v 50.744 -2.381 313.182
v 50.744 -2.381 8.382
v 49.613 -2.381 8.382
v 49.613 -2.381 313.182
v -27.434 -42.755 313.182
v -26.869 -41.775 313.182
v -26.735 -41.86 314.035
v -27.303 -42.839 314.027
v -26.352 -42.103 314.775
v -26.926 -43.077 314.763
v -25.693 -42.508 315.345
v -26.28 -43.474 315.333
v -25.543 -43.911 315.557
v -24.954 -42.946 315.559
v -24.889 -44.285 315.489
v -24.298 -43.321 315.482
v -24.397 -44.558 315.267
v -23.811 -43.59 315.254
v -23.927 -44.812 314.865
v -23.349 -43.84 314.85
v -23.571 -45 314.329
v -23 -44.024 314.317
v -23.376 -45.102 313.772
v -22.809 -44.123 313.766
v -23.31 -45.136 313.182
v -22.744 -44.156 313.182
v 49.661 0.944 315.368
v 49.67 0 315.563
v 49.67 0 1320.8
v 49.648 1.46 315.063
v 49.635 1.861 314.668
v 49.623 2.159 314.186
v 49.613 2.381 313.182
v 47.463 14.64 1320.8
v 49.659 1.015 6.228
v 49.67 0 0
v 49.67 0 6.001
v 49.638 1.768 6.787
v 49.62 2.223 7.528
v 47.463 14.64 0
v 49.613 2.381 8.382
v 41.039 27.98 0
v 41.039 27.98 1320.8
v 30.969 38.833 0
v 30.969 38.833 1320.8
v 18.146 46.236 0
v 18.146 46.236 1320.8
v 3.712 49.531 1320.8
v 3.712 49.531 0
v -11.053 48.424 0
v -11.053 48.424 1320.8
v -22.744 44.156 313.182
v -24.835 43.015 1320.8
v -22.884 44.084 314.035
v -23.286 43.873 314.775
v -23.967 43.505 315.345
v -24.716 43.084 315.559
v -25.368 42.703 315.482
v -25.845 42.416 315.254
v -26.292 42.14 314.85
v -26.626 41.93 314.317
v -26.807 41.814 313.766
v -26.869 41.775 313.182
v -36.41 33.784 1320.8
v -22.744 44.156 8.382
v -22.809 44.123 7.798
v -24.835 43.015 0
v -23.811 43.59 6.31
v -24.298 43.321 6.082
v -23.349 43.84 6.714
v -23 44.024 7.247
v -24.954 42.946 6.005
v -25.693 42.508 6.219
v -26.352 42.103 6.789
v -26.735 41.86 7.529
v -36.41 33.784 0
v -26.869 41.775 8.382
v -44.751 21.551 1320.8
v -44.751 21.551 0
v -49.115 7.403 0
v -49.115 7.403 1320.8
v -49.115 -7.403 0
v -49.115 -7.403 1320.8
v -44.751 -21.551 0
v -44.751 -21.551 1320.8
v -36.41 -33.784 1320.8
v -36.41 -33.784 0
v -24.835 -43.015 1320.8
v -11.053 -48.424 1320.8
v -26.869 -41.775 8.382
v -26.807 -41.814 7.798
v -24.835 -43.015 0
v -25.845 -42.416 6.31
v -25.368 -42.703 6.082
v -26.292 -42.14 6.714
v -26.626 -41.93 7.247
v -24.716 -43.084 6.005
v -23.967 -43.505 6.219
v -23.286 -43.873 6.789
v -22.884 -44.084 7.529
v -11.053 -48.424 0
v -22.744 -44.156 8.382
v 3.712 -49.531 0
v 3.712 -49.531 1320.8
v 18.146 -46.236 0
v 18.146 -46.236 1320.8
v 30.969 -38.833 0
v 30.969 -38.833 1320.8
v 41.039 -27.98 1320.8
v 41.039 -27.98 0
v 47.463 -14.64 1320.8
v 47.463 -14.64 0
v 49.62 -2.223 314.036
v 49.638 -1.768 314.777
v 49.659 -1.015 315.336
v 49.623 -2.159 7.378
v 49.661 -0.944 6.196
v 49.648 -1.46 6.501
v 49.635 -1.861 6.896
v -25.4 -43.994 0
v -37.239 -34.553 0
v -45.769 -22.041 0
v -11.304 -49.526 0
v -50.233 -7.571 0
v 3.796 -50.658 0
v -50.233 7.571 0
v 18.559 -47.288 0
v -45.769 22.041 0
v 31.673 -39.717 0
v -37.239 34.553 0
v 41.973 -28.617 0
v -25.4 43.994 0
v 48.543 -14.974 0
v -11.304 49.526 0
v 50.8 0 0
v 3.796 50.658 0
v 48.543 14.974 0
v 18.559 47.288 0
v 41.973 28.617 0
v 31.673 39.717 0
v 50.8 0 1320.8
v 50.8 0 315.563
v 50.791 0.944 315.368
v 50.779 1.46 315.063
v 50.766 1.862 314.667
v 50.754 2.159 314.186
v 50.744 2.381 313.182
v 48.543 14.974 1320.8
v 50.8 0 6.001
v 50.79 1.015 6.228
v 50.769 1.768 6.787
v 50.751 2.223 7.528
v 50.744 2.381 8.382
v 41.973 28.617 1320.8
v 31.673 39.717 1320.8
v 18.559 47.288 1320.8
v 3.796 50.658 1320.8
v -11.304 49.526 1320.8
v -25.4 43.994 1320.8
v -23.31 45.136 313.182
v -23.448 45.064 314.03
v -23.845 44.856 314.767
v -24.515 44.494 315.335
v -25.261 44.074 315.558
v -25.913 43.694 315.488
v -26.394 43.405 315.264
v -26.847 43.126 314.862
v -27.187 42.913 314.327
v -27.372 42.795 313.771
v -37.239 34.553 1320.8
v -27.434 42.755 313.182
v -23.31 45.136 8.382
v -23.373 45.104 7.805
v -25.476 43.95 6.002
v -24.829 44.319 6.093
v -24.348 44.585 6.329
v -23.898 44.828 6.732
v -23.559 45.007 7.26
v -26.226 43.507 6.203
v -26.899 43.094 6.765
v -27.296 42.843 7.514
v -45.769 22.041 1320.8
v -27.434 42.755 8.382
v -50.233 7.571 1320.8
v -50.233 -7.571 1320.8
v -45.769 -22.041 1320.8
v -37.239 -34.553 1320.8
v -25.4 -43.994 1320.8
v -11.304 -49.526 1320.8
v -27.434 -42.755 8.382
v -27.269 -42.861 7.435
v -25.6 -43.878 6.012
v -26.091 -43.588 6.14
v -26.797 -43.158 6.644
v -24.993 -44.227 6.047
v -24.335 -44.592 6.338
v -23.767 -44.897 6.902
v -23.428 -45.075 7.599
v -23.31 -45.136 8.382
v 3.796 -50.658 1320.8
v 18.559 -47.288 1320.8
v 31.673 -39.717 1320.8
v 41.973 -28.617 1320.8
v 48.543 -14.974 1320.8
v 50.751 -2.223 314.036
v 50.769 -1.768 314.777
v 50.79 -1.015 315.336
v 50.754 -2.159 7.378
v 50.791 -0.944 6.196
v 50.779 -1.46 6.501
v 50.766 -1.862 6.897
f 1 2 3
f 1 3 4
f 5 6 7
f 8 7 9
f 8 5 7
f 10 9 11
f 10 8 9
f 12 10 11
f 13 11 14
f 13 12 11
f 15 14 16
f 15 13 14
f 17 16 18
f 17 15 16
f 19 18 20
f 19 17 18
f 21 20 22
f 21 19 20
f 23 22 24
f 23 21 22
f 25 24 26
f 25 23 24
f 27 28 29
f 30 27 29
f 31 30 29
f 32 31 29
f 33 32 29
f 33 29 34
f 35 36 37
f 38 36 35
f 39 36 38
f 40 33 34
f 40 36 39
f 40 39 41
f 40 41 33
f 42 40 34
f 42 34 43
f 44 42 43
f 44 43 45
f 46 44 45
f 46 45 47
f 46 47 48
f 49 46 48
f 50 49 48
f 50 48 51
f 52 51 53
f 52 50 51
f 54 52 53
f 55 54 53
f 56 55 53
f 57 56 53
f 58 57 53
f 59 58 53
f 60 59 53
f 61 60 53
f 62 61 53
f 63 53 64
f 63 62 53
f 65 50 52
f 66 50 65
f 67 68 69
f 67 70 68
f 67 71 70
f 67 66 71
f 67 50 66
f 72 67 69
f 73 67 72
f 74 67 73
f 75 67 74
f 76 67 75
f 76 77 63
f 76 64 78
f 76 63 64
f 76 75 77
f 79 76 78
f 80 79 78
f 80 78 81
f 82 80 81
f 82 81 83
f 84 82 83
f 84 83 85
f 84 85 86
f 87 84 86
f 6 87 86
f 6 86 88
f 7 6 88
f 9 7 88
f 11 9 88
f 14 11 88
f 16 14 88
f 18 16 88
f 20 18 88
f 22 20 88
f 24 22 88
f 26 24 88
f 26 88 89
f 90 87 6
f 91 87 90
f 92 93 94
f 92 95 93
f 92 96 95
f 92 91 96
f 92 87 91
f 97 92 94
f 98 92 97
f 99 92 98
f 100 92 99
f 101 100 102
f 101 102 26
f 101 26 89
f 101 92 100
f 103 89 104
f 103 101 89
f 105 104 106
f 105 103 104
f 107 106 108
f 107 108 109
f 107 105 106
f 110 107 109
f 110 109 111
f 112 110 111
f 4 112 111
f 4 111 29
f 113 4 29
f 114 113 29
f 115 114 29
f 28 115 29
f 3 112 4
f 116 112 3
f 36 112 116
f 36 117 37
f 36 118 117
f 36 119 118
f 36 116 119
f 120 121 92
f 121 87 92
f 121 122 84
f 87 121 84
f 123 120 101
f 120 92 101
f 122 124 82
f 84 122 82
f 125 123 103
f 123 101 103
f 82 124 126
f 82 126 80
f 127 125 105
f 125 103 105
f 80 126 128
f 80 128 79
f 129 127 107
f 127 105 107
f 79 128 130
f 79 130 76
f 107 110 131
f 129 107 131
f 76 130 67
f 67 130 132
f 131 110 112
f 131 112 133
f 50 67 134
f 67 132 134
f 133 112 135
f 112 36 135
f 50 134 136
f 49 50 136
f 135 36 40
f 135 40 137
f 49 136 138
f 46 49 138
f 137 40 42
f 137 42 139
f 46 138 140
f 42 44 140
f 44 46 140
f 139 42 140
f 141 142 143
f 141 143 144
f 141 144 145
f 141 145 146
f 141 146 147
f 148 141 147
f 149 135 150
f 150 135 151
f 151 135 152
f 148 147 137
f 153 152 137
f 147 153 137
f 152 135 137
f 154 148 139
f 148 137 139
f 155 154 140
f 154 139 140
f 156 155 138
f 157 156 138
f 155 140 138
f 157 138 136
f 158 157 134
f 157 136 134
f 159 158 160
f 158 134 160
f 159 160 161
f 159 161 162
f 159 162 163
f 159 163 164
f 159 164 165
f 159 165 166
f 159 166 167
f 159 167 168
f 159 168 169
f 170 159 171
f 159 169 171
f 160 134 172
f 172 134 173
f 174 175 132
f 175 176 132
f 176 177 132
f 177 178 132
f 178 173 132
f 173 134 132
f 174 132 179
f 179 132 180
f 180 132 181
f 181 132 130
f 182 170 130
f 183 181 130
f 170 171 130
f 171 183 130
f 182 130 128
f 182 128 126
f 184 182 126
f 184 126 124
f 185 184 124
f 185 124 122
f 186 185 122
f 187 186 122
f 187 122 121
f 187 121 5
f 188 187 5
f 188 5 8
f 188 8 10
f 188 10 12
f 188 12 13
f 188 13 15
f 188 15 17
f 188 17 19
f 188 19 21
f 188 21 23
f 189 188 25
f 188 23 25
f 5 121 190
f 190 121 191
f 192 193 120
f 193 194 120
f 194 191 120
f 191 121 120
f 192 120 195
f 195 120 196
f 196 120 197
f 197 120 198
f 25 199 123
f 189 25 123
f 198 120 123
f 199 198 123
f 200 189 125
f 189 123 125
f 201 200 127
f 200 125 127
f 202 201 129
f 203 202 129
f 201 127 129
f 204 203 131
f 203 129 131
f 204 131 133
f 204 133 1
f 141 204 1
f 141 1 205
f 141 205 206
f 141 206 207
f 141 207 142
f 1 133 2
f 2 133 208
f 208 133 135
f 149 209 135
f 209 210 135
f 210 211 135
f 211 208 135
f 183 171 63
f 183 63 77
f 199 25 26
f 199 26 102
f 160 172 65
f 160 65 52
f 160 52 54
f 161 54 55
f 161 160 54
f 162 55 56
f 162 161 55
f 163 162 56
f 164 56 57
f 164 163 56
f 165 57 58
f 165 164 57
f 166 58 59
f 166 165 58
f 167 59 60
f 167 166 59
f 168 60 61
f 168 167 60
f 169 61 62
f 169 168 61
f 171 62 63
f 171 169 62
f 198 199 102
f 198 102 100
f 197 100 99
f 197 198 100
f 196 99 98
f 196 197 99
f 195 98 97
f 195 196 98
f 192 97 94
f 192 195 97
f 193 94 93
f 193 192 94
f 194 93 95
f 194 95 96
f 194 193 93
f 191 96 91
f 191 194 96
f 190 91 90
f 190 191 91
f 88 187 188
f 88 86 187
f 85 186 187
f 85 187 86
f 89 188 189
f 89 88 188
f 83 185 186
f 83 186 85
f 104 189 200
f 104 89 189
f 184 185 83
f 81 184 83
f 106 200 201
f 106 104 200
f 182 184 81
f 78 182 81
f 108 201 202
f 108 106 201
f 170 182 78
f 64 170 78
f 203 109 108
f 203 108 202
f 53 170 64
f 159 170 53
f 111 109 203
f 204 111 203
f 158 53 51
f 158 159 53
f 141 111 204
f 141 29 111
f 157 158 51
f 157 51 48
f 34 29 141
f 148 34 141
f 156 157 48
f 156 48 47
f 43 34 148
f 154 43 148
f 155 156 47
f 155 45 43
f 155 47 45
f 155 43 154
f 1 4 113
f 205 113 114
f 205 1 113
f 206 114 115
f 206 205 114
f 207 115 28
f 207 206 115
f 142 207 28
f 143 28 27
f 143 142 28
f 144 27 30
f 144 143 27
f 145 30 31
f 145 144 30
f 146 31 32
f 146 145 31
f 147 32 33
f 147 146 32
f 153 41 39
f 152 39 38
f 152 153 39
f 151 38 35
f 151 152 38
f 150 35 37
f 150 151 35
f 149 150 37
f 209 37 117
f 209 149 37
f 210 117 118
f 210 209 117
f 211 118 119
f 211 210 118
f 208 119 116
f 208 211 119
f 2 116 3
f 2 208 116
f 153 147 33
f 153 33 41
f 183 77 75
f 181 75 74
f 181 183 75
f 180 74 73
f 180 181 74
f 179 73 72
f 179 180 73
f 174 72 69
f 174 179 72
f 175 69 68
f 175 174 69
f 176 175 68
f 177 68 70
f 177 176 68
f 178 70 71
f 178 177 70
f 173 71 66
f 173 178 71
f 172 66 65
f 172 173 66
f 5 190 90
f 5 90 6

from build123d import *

# Parameters (mm, degrees)
SKETCH1_R               = 50.8
SKETCH1_R_2             = 49.6697
BOSS_EXTRUDE1_DEPTH     = 1320.8
CUT_EXTRUDE1_REACH      = 1327.676
CUT_EXTRUDE1_END_RADIUS = 49.6697
CIRPATTERN1_COUNT       = 3


with BuildPart() as part:
    # Sketch1 → Boss-Extrude1 (new body)
    with BuildSketch(Plane.XY):
        Circle(SKETCH1_R)
        Circle(SKETCH1_R_2, mode=Mode.SUBTRACT)
    extrude(amount=BOSS_EXTRUDE1_DEPTH)

    # Cut-Extrude1: up to this cylinder (the profile starts outside it)
    cut_extrude1_end = Plane(origin=(0, 0, 160.782), z_dir=(0, 0, -1)) * Cylinder(CUT_EXTRUDE1_END_RADIUS, 2755.6914, mode=Mode.PRIVATE)
    # Sketch2 → Cut-Extrude1 (cut, up to the surface)
    with BuildSketch(Plane(origin=(50.8, 0, 0), x_dir=(0, 0, -1), z_dir=(1, 0, 0)), mode=Mode.PRIVATE) as cut_extrude1_sk1:
        with BuildLine():
            Line((-8.382, -2.38125), (-313.182, -2.38125))
            ThreePointArc((-313.182, -2.38125), (-315.56325, 0), (-313.182, 2.38125))
            Line((-313.182, 2.38125), (-8.382, 2.38125))
            ThreePointArc((-8.382, 2.38125), (-6.00075, 0), (-8.382, -2.38125))
        make_face()
    cut_extrude1_tool1 = extrude(cut_extrude1_sk1.sketch, amount=-CUT_EXTRUDE1_REACH, mode=Mode.PRIVATE) - cut_extrude1_end
    cut_extrude1 = cut_extrude1_tool1.solids().sort_by_distance((50.8, 0, 160.782))[0]
    add(cut_extrude1, mode=Mode.SUBTRACT)

    # CirPattern1: Cut-Extrude1 ×3 about axis
    cirpattern1_axis = Axis((0, 0, 0), (0, 0, 1))
    for i in range(1, CIRPATTERN1_COUNT):
        add(cut_extrude1.rotate(cirpattern1_axis, i * 360 / CIRPATTERN1_COUNT), mode=Mode.SUBTRACT)


solid = part.part
